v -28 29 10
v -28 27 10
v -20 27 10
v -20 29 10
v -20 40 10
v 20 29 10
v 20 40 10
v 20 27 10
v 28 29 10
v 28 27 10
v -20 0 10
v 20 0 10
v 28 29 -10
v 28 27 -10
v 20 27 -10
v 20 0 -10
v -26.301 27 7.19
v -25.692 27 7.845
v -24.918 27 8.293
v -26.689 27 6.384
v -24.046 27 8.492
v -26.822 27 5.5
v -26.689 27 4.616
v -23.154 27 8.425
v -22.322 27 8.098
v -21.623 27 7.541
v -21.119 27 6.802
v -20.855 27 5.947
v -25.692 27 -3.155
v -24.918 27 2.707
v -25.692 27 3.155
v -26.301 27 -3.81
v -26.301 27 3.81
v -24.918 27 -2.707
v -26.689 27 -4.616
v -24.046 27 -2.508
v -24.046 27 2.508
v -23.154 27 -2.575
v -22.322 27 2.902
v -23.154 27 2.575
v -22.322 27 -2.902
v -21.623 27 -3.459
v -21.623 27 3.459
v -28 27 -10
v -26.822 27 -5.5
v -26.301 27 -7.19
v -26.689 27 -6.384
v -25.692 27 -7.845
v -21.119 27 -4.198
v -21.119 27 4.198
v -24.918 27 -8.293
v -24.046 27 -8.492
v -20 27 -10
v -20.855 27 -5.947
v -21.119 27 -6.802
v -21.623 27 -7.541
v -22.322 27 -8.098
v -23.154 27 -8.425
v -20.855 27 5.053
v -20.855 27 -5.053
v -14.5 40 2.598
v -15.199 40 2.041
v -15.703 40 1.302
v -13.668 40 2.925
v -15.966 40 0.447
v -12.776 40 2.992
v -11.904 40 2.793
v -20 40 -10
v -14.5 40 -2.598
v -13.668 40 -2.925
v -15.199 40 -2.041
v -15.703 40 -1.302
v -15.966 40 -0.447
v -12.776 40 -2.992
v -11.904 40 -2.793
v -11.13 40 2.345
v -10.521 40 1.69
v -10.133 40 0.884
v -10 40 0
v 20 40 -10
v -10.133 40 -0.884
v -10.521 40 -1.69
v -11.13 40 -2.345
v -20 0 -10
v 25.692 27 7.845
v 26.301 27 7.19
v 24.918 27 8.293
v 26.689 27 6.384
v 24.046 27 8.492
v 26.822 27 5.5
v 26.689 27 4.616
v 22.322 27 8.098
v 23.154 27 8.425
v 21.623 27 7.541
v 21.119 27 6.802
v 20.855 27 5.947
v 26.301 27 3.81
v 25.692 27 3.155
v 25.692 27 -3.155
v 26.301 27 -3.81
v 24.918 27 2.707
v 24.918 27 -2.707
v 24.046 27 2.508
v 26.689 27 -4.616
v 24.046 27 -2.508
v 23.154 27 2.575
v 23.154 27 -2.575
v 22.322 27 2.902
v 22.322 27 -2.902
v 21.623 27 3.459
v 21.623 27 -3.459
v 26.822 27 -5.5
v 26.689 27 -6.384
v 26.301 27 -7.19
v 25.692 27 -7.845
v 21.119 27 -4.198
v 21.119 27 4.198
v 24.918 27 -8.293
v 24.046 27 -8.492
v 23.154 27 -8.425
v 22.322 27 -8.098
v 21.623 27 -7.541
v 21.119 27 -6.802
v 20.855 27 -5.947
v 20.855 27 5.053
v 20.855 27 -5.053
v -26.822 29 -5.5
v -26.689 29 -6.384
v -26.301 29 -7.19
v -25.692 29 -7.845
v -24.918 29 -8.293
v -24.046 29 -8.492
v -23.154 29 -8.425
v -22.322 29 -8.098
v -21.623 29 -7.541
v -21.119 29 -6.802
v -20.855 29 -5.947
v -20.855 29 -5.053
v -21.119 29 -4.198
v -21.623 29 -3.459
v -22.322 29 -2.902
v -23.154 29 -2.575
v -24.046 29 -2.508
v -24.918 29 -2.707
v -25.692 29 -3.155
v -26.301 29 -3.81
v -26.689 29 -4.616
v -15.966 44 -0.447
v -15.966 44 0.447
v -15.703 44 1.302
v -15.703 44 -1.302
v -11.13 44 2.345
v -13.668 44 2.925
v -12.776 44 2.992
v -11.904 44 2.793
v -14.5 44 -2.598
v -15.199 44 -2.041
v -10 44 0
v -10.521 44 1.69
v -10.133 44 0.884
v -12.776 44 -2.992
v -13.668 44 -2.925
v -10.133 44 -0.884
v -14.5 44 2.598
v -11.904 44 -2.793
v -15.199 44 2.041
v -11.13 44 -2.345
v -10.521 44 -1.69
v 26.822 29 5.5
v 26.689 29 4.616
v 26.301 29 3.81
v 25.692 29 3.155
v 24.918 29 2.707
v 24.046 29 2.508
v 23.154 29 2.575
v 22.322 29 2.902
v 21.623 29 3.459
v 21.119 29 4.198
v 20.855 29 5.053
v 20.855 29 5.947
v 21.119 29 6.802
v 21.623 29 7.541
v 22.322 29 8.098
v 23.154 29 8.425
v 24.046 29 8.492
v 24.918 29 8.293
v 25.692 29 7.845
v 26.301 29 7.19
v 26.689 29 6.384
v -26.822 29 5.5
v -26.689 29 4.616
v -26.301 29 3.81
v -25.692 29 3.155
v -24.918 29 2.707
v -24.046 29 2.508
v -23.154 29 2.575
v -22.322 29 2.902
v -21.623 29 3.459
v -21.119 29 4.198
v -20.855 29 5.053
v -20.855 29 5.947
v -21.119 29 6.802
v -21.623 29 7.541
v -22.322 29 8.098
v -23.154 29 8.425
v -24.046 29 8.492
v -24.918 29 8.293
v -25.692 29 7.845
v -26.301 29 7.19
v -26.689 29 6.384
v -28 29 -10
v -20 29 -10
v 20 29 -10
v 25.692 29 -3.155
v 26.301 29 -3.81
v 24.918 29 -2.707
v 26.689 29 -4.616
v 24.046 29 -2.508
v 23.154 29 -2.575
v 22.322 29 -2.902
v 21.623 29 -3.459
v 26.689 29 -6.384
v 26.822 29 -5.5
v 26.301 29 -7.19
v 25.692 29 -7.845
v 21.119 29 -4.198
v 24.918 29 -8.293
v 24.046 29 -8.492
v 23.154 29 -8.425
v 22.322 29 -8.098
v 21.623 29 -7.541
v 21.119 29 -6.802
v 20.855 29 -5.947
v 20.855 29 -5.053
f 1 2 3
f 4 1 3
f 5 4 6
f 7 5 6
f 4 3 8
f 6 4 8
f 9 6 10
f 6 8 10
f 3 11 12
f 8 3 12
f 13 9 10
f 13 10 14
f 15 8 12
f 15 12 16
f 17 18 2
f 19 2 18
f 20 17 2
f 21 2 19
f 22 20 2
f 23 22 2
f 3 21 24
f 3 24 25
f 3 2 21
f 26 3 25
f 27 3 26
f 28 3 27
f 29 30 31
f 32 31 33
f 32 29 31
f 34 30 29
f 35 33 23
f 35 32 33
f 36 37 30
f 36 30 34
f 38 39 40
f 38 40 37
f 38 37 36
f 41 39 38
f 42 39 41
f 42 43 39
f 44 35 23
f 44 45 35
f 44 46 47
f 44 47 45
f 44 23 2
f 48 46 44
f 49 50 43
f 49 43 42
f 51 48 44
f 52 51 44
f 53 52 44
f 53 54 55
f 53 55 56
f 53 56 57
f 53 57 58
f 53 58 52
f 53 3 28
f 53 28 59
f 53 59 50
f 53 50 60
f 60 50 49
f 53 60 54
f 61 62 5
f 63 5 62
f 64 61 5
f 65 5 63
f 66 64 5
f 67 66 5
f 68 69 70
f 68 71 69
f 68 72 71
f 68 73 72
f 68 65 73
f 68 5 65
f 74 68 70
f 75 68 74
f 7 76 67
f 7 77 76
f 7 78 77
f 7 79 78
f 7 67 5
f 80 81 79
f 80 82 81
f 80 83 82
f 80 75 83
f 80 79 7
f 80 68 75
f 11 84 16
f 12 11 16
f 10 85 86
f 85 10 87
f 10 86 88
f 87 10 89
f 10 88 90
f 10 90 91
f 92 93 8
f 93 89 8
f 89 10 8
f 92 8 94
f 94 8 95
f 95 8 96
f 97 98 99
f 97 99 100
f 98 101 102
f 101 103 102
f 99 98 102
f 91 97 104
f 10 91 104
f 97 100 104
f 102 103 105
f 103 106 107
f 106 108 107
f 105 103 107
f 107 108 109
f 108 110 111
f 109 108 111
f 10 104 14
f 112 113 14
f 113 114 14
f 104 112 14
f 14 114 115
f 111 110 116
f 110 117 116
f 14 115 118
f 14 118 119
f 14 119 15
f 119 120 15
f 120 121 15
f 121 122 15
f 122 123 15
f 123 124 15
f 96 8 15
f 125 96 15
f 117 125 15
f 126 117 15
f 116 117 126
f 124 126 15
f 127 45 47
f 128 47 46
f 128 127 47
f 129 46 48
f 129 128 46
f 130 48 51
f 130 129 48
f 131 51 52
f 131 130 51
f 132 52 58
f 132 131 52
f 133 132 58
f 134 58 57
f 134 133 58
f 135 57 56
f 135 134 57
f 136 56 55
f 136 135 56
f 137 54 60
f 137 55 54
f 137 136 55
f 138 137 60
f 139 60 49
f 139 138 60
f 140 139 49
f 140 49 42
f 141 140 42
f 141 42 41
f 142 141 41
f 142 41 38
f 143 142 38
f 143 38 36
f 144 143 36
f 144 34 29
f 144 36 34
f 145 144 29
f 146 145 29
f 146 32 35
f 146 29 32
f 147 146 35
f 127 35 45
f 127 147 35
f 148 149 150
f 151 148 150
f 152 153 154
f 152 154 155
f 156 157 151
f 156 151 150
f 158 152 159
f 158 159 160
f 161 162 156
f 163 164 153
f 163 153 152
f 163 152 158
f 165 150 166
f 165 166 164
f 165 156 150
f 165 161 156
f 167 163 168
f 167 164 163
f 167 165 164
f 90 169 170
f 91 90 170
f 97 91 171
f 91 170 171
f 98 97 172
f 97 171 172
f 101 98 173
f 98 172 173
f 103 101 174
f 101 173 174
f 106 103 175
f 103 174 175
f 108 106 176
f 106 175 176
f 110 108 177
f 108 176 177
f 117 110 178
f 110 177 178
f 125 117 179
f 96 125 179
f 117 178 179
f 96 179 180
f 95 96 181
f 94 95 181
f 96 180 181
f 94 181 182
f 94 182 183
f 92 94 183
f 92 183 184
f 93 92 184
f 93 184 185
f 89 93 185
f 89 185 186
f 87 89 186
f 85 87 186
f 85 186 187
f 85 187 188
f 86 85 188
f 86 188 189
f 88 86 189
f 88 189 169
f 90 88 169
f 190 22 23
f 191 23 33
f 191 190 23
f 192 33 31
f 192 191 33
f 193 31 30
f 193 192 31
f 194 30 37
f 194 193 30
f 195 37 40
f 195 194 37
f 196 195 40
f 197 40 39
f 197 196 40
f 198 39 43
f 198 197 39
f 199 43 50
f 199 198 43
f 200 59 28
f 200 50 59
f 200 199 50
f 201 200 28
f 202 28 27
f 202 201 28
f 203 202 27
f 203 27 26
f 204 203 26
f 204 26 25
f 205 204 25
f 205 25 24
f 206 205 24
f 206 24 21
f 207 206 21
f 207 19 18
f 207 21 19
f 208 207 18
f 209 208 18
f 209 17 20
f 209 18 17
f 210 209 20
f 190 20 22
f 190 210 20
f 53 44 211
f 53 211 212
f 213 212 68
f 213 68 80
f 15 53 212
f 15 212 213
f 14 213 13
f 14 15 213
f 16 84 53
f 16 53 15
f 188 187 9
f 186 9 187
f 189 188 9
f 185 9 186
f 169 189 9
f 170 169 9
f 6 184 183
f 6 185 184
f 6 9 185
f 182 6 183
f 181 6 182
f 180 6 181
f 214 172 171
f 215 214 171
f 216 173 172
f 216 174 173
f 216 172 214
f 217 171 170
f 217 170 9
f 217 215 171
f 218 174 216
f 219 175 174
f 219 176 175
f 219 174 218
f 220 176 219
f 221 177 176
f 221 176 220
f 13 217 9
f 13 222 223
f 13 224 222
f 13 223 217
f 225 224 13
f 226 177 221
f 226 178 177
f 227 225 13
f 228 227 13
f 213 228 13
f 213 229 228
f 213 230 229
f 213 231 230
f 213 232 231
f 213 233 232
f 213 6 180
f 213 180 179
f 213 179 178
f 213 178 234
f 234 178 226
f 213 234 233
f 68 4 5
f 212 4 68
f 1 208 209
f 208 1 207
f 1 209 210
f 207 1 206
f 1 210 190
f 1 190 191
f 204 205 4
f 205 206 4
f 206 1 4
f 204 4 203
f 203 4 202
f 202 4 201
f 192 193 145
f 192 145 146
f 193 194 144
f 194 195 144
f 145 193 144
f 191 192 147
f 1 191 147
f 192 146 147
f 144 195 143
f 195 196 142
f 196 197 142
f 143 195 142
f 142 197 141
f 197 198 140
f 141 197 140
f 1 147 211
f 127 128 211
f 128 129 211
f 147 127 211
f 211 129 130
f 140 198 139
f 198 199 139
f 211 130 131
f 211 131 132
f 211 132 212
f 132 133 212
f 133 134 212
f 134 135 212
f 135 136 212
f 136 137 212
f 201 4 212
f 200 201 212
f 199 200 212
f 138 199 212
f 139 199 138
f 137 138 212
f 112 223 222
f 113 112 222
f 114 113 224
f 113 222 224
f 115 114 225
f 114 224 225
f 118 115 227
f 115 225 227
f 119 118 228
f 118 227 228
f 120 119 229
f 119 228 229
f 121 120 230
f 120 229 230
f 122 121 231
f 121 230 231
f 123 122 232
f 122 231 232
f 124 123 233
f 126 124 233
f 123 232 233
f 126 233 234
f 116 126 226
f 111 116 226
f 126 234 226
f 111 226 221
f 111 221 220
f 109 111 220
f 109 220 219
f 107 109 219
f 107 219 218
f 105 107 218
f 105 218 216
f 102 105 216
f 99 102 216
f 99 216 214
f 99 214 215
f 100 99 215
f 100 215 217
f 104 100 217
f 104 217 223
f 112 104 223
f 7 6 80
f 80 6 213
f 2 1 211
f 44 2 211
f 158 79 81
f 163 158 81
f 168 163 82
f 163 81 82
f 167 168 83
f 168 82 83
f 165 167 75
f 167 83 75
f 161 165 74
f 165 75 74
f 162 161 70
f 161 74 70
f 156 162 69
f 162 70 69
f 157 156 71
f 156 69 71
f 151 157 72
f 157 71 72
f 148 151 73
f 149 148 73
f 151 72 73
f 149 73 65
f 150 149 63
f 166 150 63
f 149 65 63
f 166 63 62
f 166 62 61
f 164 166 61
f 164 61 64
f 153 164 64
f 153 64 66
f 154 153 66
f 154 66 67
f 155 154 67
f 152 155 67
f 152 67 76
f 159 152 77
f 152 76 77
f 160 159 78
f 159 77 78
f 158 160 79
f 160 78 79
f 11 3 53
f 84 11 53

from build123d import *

# Parameters (mm, degrees)
SKETCH1_W           = 40
SKETCH1_H           = 20
BOSS_EXTRUDE1_DEPTH = 40
SKETCH2_R           = 3
BOSS_EXTRUDE2_DEPTH = 4
SKETCH3_W           = 20
SKETCH3_H           = 2
BOSS_EXTRUDE3_DEPTH = 8
SKETCH4_R           = 3
CUT_EXTRUDE1_DEPTH  = 30


with BuildPart() as part:
    # Sketch1 → Boss-Extrude1 (new body)
    with BuildSketch(Plane(origin=(0, 0, 0), x_dir=(1, 0, 0), z_dir=(0, 1, 0))):
        Rectangle(SKETCH1_W, SKETCH1_H)
    extrude(amount=BOSS_EXTRUDE1_DEPTH)

    # Sketch2 → Boss-Extrude2 (add)
    with BuildSketch(Plane(origin=(0, 40, 0), x_dir=(1, 0, 0), z_dir=(0, 1, 0))):
        with Locations((-13, 0)):
            Circle(SKETCH2_R)
    extrude(amount=BOSS_EXTRUDE2_DEPTH)

    # Sketch3 → Boss-Extrude3 (add)
    with BuildSketch(Plane(origin=(20, 0, 0), x_dir=(0, 0, -1), z_dir=(1, 0, 0))):
        with Locations((0, 28)):
            Rectangle(SKETCH3_W, SKETCH3_H)
    boss_extrude3 = extrude(amount=BOSS_EXTRUDE3_DEPTH)

    # Sketch4 → Cut-Extrude1 (cut, through all)
    with BuildSketch(Plane(origin=(0, 29, 0), x_dir=(1, 0, 0), z_dir=(0, 1, 0))):
        with Locations((23.821894681, 5.5)):
            Circle(SKETCH4_R)
        with Locations((23.821894681, -5.5)):
            Circle(SKETCH4_R)
    cut_extrude1 = extrude(amount=-CUT_EXTRUDE1_DEPTH, mode=Mode.SUBTRACT)

    # Mirror2: Boss-Extrude3, Cut-Extrude1 across plane
    add(boss_extrude3.mirror(Plane(origin=(0, 0, 0), x_dir=(0, 0, 1), z_dir=(1, 0, 0))))
    add(cut_extrude1.mirror(Plane(origin=(0, 0, 0), x_dir=(0, 0, 1), z_dir=(1, 0, 0))), mode=Mode.SUBTRACT)


solid = part.part
